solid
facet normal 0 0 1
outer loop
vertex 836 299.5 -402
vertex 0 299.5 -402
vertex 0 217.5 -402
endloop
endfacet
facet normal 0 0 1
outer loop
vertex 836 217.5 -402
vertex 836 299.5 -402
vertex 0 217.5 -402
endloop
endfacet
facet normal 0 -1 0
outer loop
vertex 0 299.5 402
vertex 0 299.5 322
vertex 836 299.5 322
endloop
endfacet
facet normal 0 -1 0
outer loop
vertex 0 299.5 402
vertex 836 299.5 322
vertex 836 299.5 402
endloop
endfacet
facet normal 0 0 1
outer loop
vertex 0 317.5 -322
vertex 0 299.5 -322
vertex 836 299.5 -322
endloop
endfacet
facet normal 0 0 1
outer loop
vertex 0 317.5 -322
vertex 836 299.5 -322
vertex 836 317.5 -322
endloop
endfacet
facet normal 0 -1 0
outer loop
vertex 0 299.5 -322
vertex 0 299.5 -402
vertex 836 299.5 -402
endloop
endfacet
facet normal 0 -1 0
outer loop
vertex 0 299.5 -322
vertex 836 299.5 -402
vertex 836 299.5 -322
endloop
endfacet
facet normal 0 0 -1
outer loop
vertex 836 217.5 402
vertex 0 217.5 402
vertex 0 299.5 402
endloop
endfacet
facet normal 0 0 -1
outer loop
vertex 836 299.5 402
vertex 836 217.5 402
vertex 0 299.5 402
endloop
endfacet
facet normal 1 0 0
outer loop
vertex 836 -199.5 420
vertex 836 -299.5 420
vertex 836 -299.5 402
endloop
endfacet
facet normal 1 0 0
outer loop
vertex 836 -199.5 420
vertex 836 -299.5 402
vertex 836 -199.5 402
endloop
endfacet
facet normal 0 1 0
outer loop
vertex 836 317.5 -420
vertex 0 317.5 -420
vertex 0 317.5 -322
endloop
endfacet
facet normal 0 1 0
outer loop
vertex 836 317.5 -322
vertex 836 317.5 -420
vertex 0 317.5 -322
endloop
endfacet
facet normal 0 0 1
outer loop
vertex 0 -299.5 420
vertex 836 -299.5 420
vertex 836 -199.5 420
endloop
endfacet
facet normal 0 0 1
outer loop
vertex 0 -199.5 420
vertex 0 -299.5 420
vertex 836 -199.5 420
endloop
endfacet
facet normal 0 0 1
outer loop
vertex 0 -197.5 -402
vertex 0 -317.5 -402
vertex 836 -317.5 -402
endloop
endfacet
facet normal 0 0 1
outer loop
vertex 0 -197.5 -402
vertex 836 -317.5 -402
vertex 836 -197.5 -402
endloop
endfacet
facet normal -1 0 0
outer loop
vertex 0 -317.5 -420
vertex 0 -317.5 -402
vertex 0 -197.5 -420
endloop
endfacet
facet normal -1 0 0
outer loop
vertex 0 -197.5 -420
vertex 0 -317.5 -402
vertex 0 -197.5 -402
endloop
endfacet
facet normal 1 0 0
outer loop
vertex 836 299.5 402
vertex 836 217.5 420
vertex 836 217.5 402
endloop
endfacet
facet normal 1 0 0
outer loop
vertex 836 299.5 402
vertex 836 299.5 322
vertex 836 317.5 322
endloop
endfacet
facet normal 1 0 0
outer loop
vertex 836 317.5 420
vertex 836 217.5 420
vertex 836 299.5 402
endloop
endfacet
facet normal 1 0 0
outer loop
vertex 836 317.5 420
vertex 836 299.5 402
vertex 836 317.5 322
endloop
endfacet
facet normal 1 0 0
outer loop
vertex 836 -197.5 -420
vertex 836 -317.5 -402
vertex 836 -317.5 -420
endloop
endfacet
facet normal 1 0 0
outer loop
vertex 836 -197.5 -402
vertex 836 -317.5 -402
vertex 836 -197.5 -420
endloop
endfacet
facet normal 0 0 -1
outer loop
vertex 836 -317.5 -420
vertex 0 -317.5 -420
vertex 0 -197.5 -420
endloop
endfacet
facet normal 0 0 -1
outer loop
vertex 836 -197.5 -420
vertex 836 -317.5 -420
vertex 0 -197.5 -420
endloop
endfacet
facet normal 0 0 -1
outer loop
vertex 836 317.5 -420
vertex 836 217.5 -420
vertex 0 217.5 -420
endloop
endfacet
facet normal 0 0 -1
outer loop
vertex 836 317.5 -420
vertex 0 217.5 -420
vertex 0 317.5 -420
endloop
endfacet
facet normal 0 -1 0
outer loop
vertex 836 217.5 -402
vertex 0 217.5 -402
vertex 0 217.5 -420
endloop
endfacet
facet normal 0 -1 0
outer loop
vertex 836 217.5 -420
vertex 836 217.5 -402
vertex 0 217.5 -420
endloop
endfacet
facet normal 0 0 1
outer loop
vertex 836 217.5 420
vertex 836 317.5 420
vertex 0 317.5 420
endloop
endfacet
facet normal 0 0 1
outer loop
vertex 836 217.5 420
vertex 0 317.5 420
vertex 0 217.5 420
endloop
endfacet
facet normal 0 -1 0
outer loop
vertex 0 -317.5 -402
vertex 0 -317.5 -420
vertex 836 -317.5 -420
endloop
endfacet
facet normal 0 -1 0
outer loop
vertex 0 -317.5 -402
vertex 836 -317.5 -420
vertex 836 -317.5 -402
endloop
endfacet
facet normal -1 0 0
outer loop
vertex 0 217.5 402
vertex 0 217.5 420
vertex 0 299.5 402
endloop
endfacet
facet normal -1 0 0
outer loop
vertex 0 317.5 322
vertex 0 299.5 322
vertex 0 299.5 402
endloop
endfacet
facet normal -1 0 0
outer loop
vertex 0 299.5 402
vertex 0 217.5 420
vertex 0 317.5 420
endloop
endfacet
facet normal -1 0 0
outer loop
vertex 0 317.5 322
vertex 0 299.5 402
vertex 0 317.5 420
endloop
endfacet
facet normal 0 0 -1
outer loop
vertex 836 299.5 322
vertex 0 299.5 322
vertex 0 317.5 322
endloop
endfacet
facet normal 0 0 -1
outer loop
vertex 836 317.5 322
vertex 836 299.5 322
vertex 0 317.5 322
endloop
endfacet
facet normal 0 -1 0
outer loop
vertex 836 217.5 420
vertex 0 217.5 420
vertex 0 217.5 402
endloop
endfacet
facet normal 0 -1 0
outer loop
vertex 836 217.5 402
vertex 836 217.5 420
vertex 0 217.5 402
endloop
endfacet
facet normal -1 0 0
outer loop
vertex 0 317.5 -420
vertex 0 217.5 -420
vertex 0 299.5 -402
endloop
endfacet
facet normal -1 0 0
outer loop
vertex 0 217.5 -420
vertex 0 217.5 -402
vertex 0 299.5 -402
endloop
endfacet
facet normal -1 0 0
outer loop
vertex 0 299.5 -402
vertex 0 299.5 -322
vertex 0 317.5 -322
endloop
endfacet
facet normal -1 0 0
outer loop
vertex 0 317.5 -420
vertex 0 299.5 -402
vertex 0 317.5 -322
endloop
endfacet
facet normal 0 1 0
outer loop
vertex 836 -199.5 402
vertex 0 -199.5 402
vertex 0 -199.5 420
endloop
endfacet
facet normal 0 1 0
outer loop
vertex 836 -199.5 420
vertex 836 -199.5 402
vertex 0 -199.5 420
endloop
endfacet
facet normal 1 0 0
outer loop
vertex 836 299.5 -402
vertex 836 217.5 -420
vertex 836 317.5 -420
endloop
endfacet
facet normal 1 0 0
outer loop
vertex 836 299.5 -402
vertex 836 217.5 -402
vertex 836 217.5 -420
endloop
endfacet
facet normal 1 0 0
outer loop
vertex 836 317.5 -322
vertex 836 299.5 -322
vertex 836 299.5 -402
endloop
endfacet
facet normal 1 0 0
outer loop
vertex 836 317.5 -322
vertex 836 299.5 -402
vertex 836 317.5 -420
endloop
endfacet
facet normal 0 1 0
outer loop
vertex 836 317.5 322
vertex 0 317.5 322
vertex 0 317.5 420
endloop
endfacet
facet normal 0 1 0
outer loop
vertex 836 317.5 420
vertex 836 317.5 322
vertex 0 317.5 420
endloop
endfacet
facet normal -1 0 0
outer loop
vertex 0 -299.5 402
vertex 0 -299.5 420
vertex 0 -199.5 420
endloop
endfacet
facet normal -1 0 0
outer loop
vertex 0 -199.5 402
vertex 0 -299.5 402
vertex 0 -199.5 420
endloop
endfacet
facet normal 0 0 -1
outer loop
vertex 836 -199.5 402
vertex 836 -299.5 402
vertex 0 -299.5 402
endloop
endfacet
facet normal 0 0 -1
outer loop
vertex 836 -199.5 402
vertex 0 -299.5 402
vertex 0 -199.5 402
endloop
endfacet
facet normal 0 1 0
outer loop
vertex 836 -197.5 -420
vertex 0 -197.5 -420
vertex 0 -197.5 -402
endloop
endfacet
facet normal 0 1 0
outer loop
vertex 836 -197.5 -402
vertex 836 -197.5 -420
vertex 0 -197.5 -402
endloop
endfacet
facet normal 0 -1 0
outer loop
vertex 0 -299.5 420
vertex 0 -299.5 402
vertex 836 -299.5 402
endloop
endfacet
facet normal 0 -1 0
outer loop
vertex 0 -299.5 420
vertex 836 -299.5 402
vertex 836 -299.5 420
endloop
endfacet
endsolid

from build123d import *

# Parameters (mm, degrees)
F0_W     = 18
F0_H     = 80
F0_W_2   = 100
F0_H_2   = 18
F0_W_3   = 120
F1_DEPTH = 836


with BuildPart() as f1:
    # F0 (on Right) → F1 (new body)
    with BuildSketch(Plane.YZ):
        Polygon((317.5, 402), (317.5, 420), (217.5, 420), (217.5, 402), (299.5, 402), align=None)
        with Locations((308.5, 362)):
            Rectangle(F0_W, F0_H)
        with Locations((-249.5, 411)):
            Rectangle(F0_W_2, F0_H_2)
        with Locations((-257.5, -411)):
            Rectangle(F0_W_3, F0_H_2)
        Polygon((217.5, -420), (317.5, -420), (317.5, -402), (299.5, -402), (217.5, -402), align=None)
        with Locations((308.5, -362)):
            Rectangle(F0_W, F0_H)
    extrude(amount=F1_DEPTH)


solid = f1.part
